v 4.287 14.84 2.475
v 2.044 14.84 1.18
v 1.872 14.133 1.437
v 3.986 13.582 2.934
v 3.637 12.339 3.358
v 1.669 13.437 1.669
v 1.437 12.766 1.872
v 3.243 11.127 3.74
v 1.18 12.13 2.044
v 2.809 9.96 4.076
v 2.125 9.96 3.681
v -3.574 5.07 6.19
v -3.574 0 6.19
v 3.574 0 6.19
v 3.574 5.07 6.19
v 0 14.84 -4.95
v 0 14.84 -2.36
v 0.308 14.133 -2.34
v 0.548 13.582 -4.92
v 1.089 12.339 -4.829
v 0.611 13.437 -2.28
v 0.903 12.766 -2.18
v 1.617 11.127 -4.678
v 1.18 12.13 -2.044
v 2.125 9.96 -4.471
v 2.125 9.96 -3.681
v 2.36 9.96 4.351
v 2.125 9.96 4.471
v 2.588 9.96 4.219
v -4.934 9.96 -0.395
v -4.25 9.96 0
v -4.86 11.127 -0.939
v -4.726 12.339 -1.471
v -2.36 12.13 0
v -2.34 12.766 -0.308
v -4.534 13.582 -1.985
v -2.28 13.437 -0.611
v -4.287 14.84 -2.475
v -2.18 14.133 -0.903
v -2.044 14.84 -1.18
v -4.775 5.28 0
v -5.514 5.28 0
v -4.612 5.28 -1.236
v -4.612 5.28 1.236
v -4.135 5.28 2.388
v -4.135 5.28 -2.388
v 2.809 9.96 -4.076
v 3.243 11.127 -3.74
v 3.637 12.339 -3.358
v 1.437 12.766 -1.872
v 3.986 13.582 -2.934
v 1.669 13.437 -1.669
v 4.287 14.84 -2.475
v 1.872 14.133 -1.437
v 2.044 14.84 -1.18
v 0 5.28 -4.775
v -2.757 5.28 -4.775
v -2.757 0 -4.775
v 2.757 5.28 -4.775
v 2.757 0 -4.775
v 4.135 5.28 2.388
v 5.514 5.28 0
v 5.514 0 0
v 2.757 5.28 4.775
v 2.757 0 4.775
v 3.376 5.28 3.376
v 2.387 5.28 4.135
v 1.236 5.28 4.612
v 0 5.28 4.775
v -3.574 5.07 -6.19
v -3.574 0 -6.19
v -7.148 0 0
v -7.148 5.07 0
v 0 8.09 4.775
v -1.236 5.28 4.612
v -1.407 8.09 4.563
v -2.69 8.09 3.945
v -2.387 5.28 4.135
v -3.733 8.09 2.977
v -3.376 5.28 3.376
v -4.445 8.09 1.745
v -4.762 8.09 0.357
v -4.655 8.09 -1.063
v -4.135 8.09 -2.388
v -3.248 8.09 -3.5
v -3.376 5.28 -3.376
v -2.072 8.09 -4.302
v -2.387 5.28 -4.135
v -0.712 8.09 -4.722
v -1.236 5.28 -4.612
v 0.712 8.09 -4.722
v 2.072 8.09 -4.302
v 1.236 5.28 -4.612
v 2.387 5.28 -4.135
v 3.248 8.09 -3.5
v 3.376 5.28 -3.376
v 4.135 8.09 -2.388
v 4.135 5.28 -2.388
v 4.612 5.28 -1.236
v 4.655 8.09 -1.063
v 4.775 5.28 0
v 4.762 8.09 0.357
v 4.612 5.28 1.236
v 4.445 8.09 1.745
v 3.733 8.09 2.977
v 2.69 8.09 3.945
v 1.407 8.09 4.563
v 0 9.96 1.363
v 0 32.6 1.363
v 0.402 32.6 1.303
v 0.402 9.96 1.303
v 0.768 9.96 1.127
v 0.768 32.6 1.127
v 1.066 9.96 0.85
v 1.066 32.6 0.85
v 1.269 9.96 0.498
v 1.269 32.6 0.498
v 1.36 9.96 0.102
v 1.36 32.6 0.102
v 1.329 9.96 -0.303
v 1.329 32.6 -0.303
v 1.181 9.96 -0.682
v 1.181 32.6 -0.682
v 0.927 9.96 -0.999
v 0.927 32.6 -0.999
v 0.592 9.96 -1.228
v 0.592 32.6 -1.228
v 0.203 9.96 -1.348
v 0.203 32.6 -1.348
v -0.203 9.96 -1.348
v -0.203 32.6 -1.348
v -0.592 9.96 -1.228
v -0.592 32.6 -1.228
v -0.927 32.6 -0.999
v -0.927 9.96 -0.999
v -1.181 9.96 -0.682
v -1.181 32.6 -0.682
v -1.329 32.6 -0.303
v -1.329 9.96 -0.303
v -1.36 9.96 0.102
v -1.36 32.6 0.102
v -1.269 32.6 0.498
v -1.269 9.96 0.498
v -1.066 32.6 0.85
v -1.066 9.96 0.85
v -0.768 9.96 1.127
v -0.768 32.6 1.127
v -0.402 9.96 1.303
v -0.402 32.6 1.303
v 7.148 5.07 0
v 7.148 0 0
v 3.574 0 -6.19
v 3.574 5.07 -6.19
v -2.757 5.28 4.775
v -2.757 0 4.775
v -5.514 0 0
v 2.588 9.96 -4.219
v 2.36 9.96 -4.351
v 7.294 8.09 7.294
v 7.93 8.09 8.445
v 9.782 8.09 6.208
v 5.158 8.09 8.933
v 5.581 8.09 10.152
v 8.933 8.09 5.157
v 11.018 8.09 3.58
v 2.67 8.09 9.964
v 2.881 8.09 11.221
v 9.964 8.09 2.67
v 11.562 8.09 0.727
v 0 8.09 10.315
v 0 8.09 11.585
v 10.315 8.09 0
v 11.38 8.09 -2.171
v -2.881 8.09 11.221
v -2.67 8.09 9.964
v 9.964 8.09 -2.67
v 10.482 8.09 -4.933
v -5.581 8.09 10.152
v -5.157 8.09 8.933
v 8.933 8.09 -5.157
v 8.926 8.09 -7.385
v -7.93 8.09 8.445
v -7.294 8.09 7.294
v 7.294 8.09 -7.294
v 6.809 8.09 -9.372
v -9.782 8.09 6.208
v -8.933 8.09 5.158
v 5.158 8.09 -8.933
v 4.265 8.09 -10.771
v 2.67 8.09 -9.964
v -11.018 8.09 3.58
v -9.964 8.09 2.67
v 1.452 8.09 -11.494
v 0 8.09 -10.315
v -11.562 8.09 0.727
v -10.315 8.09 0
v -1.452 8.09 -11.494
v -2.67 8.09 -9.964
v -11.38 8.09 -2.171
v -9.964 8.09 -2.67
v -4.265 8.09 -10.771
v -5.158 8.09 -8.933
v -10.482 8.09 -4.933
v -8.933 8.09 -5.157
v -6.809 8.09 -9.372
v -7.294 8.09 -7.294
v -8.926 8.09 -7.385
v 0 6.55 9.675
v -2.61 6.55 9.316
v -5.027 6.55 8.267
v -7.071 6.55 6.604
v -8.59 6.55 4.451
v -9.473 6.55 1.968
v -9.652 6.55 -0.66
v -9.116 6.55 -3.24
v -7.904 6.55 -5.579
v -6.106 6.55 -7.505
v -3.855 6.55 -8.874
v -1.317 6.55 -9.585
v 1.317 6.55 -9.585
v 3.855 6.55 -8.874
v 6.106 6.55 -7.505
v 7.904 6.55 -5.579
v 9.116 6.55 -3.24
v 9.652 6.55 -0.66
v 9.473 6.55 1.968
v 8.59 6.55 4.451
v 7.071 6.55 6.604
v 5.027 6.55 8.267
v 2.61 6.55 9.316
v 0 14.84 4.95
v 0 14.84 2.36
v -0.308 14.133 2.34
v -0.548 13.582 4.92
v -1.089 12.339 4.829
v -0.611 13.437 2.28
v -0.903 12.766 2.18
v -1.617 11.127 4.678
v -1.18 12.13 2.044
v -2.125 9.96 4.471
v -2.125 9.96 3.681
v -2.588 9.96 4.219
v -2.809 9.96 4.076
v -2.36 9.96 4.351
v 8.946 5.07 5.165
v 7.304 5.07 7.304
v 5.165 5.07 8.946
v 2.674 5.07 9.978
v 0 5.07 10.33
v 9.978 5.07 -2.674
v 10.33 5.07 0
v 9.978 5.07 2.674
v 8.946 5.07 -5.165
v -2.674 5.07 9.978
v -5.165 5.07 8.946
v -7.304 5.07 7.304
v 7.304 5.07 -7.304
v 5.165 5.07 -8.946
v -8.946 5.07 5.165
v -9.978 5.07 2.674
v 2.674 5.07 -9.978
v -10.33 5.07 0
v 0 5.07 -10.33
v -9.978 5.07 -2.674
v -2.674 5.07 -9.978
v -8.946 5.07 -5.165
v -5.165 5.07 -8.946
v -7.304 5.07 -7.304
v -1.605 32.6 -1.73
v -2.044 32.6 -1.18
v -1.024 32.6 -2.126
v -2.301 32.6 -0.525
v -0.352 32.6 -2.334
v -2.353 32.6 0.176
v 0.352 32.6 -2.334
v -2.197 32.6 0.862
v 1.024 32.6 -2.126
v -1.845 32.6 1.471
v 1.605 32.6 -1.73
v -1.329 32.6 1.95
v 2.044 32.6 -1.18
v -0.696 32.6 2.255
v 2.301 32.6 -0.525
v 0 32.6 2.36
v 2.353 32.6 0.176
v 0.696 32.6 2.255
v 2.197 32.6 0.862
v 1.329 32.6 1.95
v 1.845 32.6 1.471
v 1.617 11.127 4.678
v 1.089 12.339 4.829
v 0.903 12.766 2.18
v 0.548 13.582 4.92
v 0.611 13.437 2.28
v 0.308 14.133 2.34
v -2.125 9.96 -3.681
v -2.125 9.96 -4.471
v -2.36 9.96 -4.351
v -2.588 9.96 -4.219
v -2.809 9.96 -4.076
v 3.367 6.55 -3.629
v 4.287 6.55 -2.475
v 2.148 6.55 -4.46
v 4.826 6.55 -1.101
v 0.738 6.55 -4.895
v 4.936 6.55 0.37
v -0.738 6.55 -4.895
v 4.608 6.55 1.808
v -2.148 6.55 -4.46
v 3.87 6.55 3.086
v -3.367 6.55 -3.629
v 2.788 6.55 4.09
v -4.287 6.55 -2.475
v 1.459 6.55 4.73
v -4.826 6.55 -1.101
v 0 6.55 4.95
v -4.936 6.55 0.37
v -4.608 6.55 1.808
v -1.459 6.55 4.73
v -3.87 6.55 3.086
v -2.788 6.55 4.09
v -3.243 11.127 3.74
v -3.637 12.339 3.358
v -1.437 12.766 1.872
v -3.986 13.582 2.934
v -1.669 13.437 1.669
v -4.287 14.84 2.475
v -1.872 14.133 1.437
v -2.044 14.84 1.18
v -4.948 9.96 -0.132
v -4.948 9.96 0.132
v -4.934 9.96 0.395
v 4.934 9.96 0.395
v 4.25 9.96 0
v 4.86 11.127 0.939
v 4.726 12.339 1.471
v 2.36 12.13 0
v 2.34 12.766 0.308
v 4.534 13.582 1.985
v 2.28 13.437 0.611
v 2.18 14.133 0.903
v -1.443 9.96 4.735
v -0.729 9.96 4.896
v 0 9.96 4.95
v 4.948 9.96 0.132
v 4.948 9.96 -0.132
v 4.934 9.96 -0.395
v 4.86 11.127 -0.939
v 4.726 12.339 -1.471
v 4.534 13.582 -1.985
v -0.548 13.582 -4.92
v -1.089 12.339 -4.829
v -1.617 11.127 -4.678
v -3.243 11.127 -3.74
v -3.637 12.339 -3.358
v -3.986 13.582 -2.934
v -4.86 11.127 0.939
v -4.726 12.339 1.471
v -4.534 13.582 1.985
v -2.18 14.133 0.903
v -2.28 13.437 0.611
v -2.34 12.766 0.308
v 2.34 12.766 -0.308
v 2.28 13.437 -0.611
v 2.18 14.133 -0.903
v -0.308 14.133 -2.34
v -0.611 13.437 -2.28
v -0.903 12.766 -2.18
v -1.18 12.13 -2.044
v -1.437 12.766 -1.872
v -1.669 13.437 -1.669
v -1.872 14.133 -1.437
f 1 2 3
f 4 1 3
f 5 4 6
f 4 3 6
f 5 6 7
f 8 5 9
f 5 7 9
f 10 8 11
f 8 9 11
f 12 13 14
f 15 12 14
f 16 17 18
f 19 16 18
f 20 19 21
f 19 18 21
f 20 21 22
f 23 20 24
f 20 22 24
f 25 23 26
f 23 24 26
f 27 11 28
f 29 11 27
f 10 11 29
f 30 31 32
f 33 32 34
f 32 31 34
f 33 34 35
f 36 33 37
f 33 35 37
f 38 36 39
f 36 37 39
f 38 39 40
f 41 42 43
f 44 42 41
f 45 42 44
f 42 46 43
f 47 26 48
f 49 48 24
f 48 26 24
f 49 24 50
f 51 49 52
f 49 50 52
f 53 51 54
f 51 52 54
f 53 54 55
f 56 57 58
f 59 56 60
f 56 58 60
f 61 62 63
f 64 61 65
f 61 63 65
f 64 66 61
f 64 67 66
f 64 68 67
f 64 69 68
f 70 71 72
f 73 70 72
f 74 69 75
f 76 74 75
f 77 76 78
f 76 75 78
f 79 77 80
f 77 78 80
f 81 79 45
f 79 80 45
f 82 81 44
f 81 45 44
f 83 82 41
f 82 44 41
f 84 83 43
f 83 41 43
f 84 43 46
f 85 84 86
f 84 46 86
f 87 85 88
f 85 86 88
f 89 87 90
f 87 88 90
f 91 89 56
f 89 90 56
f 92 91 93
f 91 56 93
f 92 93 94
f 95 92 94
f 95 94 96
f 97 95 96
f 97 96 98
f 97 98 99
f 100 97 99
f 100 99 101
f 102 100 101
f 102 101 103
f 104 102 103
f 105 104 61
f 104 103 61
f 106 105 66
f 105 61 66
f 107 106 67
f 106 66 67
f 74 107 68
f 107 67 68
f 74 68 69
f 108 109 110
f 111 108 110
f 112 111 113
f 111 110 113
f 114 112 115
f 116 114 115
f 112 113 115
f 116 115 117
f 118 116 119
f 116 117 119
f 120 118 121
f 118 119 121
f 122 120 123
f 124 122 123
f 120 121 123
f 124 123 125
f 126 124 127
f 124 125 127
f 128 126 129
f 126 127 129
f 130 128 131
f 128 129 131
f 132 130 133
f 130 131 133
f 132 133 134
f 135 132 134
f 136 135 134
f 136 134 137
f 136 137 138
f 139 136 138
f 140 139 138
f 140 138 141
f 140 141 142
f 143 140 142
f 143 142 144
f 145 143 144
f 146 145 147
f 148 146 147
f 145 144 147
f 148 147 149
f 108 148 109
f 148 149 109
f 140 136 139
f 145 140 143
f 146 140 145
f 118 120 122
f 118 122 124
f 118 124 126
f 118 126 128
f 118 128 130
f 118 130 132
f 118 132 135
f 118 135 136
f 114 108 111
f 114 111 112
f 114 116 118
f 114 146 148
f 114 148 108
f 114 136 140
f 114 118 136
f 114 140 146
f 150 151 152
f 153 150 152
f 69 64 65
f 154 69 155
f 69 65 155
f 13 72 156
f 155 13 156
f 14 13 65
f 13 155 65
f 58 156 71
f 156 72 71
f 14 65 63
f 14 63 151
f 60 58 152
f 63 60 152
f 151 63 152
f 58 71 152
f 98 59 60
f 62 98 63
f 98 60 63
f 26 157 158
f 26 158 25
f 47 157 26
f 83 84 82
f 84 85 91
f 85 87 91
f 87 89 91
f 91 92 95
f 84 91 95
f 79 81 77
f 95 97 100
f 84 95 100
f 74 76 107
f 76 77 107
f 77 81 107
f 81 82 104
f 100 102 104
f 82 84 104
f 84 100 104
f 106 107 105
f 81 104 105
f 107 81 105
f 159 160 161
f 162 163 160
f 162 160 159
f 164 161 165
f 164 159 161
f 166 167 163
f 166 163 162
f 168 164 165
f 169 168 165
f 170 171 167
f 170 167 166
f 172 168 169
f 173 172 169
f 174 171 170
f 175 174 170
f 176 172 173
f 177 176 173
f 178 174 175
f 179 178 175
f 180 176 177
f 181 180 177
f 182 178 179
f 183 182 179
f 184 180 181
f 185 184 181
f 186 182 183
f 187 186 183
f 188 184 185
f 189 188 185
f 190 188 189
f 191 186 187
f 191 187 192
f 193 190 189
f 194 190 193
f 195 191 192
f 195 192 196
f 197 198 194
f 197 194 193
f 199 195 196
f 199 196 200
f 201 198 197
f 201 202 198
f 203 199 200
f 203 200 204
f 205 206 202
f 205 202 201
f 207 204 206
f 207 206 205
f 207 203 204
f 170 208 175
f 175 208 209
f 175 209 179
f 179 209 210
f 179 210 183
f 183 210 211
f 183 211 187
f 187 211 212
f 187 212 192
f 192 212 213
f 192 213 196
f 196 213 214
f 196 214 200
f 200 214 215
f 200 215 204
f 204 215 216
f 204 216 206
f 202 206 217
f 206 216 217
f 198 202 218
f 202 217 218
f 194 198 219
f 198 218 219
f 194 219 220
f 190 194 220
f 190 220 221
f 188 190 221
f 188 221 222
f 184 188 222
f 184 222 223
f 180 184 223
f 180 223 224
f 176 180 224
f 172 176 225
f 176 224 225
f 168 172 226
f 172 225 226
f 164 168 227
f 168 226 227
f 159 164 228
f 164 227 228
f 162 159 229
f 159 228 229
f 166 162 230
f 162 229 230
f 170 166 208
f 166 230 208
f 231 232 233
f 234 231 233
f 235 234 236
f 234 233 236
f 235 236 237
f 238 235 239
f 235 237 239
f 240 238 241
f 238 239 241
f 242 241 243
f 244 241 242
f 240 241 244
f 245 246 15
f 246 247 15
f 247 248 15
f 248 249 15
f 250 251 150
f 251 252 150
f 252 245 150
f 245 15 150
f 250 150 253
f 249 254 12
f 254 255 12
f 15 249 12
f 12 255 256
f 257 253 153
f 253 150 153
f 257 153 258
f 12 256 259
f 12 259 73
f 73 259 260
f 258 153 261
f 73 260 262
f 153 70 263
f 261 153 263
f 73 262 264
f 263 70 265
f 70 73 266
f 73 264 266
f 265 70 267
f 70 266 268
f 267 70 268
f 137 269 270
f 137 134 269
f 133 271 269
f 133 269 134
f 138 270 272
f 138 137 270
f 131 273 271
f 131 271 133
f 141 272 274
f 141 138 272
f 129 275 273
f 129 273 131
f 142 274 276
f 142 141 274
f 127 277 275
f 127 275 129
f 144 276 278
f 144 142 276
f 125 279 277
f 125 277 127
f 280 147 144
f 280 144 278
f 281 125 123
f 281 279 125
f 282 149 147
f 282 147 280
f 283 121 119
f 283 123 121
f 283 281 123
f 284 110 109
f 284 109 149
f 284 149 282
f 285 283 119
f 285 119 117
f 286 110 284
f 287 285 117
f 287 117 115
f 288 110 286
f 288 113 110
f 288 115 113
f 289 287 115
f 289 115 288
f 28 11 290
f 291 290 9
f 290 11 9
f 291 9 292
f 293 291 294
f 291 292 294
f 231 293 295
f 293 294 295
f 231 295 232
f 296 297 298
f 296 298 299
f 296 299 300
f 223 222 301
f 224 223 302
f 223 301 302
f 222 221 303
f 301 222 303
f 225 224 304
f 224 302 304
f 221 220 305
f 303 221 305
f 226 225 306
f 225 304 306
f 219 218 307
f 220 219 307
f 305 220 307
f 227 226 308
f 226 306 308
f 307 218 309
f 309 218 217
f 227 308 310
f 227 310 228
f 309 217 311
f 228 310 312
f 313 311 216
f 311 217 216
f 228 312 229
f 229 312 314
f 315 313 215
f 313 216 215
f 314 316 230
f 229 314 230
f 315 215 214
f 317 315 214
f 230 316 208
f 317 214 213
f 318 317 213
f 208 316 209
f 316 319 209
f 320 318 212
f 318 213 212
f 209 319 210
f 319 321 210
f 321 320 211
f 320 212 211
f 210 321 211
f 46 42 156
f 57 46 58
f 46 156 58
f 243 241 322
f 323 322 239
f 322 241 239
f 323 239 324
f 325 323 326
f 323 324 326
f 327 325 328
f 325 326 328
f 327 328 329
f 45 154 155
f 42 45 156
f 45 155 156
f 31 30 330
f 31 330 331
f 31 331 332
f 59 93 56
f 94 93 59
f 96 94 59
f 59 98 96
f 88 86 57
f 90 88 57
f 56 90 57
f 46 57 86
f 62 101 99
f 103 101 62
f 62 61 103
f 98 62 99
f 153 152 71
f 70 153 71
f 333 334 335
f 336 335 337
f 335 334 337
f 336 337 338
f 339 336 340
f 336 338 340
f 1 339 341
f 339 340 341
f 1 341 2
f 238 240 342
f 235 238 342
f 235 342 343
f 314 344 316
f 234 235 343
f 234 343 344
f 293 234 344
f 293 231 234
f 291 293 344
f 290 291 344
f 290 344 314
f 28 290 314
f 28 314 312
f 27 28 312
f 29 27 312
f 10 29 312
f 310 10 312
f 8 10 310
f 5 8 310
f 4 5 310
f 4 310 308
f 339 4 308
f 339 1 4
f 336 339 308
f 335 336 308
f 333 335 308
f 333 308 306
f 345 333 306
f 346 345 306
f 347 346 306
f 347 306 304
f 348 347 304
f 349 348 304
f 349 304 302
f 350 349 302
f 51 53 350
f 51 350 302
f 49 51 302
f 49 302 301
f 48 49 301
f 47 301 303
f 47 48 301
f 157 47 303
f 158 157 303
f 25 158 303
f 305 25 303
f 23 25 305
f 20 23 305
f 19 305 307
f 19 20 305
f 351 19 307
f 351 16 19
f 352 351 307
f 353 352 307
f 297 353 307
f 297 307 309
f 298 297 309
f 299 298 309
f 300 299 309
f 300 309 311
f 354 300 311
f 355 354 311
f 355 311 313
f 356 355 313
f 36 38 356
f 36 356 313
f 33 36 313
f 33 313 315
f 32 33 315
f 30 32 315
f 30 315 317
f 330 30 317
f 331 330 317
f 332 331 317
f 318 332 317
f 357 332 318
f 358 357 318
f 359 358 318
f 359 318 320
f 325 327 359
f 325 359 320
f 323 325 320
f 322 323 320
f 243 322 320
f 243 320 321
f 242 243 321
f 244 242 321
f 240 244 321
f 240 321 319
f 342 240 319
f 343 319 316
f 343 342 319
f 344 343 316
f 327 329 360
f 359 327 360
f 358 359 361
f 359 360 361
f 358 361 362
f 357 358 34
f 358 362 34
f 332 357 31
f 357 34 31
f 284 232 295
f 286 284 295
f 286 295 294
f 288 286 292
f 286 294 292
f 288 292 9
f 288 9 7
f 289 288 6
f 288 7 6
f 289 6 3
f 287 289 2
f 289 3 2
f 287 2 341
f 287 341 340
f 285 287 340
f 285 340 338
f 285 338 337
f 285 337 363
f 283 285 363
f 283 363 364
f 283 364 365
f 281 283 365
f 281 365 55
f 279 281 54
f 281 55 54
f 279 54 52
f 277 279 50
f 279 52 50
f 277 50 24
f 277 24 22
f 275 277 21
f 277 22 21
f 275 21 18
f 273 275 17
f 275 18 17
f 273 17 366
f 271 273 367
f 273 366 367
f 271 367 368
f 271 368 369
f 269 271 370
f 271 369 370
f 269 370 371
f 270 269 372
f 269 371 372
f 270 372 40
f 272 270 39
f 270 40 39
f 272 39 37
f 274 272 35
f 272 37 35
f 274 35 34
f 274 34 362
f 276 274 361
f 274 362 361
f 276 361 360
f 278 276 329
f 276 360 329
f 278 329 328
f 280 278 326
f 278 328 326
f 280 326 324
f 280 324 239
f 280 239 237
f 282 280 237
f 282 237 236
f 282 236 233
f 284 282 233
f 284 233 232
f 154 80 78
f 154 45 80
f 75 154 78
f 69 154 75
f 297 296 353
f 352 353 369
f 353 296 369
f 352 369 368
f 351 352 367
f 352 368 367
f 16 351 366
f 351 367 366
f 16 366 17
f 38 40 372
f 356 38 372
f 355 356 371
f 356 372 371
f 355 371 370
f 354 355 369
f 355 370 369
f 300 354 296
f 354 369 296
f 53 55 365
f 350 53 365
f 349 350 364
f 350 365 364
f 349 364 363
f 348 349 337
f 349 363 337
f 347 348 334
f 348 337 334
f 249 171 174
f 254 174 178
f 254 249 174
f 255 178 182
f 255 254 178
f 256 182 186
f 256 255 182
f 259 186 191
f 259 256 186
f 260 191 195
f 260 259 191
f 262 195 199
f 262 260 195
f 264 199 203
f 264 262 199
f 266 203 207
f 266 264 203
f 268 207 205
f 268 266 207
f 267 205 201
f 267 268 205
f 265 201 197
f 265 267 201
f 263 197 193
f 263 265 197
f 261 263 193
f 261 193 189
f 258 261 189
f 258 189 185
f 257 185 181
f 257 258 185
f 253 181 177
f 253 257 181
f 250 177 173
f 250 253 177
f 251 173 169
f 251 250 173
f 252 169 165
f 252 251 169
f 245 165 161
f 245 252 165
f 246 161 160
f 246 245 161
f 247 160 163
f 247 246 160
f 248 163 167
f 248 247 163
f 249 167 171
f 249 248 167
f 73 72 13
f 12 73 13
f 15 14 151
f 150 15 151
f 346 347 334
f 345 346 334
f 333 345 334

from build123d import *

# Parameters (mm, degrees)
BOSS_EXTRUDE1_DEPTH      = 5.07
SKETCH2_R                = 11.585
BOSS_EXTRUDE2_DEPTH      = 3.02
CUT_EXTRUDE3_DEPTH       = 5.28
SKETCH12_R               = 4.775
CUT_EXTRUDE4_DEPTH       = 8.48
SKETCH14_R               = 2.36
BOSS_EXTRUDE5_DEPTH      = 24.51
SKETCH15_R               = 4.95
BOSS_EXTRUDE6_DEPTH      = 1.87
BOSS_EXTRUDE7_REACH      = 38.485
BOSS_EXTRUDE7_END_RADIUS = 4.95
CIRPATTERN2_COUNT        = 6
SKETCH17_R               = 1.363462741
CUT_EXTRUDE6_DEPTH       = 22.64


with BuildPart() as part:
    # Sketch1 → Boss-Extrude1 (new body)
    with BuildSketch(Plane(origin=(0, 0, 0), x_dir=(1, 0, 0), z_dir=(0, 1, 0))):
        Polygon((-3.573798166, 6.19), (-7.147596333, 0), (-3.573798166, -6.19), (3.573798166, -6.19), (7.147596333, 0), (3.573798166, 6.19), align=None)
    extrude(amount=BOSS_EXTRUDE1_DEPTH)

    # Sketch2 → Boss-Extrude2 (add)
    with BuildSketch(Plane(origin=(0, 5.07, 0), x_dir=(1, 0, 0), z_dir=(0, 1, 0))):
        with Locations(Location((0, 0, 0), (0, 0, 90))):
            Circle(SKETCH2_R)
    extrude(amount=BOSS_EXTRUDE2_DEPTH)

    # Sketch3 → Cut-Revolve1 (revolve, cut)
    with BuildSketch(Plane.XY, mode=Mode.PRIVATE) as cut_revolve1_sk:
        Polygon((10.33, 5.07), (11.585, 5.07), (11.585, 8.09), align=None)
    revolve(cut_revolve1_sk.sketch.rotate(Axis((0, 10.492775936, 0), (0, -1, 0)), 90), axis=Axis((0, 10.492775936, 0), (0, -1, 0)), mode=Mode.SUBTRACT)

    # Sketch5 → Cut-Revolve2 (revolve, cut)
    with BuildSketch(Plane.XY, mode=Mode.PRIVATE) as cut_revolve2_sk:
        Polygon((10.315, 8.09), (9.675033113, 6.55), (4.95, 6.55), (4.95, 8.27346303), (10.315, 8.27346303), align=None)
    revolve(cut_revolve2_sk.sketch.rotate(Axis((0, 10.346459419, 0), (0, -1, 0)), 90), axis=Axis((0, 10.346459419, 0), (0, -1, 0)), mode=Mode.SUBTRACT)

    # Sketch11 → Cut-Extrude3 (cut)
    with BuildSketch(Plane.XZ):
        Polygon((-2.756847535, 4.775), (-5.513695071, 0), (-2.756847535, -4.775), (2.756847535, -4.775), (5.513695071, 0), (2.756847535, 4.775), align=None)
    extrude(amount=-CUT_EXTRUDE3_DEPTH, mode=Mode.SUBTRACT)

    # Sketch12 → Cut-Extrude4 (cut)
    with BuildSketch(Plane.XZ):
        with Locations(Location((0, 0, 0), (0, 0, 90))):
            Circle(SKETCH12_R)
    extrude(amount=-CUT_EXTRUDE4_DEPTH, mode=Mode.SUBTRACT)



with BuildPart() as body_2:
    # Sketch14 → Boss-Extrude5 (new body)
    with BuildSketch(Plane(origin=(0, 8.09, 0), x_dir=(1, 0, 0), z_dir=(0, 1, 0))):
        with Locations(Location((0, 0, 0), (0, 0, 270))):
            Circle(SKETCH14_R)
    extrude(amount=BOSS_EXTRUDE5_DEPTH)


with BuildPart() as part_1:
    add(part.part)

    add(body_2.part)  # Boss-Extrude6 merges body 2
    # Sketch15 → Boss-Extrude6 (add)
    with BuildSketch(Plane(origin=(0, 8.09, 0), x_dir=(1, 0, 0), z_dir=(0, 1, 0))):
        with Locations(Location((0, 0, 0), (0, 0, 270))):
            Circle(SKETCH15_R)
    extrude(amount=BOSS_EXTRUDE6_DEPTH)

    # Boss-Extrude7: up to this cylinder (the profile starts inside it)
    boss_extrude7_end = Plane(origin=(0, 11.586667, 0), z_dir=(0, 1, 0)) * Cylinder(BOSS_EXTRUDE7_END_RADIUS, 87.87, mode=Mode.PRIVATE)
    # Sketch16 → Boss-Extrude7 (add, up to the surface)
    with BuildSketch(Plane.XY, mode=Mode.PRIVATE) as boss_extrude7_sk1:
        Polygon((0, 14.84), (-2.125, 9.96), (2.125, 9.96), align=None)
    boss_extrude7_tool1 = extrude(boss_extrude7_sk1.sketch, amount=BOSS_EXTRUDE7_REACH, mode=Mode.PRIVATE) & boss_extrude7_end
    boss_extrude7 = boss_extrude7_tool1.solids().sort_by_distance((0, 11.586667, 0))[0]
    add(boss_extrude7)

    # CirPattern2: Boss-Extrude7 ×6 about axis
    cirpattern2_axis = Axis((0, 0, 0), (0, 1, 0))
    for i in range(1, CIRPATTERN2_COUNT):
        add(boss_extrude7.rotate(cirpattern2_axis, i * 360 / CIRPATTERN2_COUNT))

    # Sketch17 → Cut-Extrude6 (cut)
    with BuildSketch(Plane(origin=(0, 32.6, 0), x_dir=(1, 0, 0), z_dir=(0, 1, 0))):
        with Locations(Location((0, 0, 0), (0, 0, 270))):
            Circle(SKETCH17_R)
    extrude(amount=-CUT_EXTRUDE6_DEPTH, mode=Mode.SUBTRACT)


solid = part_1.part
